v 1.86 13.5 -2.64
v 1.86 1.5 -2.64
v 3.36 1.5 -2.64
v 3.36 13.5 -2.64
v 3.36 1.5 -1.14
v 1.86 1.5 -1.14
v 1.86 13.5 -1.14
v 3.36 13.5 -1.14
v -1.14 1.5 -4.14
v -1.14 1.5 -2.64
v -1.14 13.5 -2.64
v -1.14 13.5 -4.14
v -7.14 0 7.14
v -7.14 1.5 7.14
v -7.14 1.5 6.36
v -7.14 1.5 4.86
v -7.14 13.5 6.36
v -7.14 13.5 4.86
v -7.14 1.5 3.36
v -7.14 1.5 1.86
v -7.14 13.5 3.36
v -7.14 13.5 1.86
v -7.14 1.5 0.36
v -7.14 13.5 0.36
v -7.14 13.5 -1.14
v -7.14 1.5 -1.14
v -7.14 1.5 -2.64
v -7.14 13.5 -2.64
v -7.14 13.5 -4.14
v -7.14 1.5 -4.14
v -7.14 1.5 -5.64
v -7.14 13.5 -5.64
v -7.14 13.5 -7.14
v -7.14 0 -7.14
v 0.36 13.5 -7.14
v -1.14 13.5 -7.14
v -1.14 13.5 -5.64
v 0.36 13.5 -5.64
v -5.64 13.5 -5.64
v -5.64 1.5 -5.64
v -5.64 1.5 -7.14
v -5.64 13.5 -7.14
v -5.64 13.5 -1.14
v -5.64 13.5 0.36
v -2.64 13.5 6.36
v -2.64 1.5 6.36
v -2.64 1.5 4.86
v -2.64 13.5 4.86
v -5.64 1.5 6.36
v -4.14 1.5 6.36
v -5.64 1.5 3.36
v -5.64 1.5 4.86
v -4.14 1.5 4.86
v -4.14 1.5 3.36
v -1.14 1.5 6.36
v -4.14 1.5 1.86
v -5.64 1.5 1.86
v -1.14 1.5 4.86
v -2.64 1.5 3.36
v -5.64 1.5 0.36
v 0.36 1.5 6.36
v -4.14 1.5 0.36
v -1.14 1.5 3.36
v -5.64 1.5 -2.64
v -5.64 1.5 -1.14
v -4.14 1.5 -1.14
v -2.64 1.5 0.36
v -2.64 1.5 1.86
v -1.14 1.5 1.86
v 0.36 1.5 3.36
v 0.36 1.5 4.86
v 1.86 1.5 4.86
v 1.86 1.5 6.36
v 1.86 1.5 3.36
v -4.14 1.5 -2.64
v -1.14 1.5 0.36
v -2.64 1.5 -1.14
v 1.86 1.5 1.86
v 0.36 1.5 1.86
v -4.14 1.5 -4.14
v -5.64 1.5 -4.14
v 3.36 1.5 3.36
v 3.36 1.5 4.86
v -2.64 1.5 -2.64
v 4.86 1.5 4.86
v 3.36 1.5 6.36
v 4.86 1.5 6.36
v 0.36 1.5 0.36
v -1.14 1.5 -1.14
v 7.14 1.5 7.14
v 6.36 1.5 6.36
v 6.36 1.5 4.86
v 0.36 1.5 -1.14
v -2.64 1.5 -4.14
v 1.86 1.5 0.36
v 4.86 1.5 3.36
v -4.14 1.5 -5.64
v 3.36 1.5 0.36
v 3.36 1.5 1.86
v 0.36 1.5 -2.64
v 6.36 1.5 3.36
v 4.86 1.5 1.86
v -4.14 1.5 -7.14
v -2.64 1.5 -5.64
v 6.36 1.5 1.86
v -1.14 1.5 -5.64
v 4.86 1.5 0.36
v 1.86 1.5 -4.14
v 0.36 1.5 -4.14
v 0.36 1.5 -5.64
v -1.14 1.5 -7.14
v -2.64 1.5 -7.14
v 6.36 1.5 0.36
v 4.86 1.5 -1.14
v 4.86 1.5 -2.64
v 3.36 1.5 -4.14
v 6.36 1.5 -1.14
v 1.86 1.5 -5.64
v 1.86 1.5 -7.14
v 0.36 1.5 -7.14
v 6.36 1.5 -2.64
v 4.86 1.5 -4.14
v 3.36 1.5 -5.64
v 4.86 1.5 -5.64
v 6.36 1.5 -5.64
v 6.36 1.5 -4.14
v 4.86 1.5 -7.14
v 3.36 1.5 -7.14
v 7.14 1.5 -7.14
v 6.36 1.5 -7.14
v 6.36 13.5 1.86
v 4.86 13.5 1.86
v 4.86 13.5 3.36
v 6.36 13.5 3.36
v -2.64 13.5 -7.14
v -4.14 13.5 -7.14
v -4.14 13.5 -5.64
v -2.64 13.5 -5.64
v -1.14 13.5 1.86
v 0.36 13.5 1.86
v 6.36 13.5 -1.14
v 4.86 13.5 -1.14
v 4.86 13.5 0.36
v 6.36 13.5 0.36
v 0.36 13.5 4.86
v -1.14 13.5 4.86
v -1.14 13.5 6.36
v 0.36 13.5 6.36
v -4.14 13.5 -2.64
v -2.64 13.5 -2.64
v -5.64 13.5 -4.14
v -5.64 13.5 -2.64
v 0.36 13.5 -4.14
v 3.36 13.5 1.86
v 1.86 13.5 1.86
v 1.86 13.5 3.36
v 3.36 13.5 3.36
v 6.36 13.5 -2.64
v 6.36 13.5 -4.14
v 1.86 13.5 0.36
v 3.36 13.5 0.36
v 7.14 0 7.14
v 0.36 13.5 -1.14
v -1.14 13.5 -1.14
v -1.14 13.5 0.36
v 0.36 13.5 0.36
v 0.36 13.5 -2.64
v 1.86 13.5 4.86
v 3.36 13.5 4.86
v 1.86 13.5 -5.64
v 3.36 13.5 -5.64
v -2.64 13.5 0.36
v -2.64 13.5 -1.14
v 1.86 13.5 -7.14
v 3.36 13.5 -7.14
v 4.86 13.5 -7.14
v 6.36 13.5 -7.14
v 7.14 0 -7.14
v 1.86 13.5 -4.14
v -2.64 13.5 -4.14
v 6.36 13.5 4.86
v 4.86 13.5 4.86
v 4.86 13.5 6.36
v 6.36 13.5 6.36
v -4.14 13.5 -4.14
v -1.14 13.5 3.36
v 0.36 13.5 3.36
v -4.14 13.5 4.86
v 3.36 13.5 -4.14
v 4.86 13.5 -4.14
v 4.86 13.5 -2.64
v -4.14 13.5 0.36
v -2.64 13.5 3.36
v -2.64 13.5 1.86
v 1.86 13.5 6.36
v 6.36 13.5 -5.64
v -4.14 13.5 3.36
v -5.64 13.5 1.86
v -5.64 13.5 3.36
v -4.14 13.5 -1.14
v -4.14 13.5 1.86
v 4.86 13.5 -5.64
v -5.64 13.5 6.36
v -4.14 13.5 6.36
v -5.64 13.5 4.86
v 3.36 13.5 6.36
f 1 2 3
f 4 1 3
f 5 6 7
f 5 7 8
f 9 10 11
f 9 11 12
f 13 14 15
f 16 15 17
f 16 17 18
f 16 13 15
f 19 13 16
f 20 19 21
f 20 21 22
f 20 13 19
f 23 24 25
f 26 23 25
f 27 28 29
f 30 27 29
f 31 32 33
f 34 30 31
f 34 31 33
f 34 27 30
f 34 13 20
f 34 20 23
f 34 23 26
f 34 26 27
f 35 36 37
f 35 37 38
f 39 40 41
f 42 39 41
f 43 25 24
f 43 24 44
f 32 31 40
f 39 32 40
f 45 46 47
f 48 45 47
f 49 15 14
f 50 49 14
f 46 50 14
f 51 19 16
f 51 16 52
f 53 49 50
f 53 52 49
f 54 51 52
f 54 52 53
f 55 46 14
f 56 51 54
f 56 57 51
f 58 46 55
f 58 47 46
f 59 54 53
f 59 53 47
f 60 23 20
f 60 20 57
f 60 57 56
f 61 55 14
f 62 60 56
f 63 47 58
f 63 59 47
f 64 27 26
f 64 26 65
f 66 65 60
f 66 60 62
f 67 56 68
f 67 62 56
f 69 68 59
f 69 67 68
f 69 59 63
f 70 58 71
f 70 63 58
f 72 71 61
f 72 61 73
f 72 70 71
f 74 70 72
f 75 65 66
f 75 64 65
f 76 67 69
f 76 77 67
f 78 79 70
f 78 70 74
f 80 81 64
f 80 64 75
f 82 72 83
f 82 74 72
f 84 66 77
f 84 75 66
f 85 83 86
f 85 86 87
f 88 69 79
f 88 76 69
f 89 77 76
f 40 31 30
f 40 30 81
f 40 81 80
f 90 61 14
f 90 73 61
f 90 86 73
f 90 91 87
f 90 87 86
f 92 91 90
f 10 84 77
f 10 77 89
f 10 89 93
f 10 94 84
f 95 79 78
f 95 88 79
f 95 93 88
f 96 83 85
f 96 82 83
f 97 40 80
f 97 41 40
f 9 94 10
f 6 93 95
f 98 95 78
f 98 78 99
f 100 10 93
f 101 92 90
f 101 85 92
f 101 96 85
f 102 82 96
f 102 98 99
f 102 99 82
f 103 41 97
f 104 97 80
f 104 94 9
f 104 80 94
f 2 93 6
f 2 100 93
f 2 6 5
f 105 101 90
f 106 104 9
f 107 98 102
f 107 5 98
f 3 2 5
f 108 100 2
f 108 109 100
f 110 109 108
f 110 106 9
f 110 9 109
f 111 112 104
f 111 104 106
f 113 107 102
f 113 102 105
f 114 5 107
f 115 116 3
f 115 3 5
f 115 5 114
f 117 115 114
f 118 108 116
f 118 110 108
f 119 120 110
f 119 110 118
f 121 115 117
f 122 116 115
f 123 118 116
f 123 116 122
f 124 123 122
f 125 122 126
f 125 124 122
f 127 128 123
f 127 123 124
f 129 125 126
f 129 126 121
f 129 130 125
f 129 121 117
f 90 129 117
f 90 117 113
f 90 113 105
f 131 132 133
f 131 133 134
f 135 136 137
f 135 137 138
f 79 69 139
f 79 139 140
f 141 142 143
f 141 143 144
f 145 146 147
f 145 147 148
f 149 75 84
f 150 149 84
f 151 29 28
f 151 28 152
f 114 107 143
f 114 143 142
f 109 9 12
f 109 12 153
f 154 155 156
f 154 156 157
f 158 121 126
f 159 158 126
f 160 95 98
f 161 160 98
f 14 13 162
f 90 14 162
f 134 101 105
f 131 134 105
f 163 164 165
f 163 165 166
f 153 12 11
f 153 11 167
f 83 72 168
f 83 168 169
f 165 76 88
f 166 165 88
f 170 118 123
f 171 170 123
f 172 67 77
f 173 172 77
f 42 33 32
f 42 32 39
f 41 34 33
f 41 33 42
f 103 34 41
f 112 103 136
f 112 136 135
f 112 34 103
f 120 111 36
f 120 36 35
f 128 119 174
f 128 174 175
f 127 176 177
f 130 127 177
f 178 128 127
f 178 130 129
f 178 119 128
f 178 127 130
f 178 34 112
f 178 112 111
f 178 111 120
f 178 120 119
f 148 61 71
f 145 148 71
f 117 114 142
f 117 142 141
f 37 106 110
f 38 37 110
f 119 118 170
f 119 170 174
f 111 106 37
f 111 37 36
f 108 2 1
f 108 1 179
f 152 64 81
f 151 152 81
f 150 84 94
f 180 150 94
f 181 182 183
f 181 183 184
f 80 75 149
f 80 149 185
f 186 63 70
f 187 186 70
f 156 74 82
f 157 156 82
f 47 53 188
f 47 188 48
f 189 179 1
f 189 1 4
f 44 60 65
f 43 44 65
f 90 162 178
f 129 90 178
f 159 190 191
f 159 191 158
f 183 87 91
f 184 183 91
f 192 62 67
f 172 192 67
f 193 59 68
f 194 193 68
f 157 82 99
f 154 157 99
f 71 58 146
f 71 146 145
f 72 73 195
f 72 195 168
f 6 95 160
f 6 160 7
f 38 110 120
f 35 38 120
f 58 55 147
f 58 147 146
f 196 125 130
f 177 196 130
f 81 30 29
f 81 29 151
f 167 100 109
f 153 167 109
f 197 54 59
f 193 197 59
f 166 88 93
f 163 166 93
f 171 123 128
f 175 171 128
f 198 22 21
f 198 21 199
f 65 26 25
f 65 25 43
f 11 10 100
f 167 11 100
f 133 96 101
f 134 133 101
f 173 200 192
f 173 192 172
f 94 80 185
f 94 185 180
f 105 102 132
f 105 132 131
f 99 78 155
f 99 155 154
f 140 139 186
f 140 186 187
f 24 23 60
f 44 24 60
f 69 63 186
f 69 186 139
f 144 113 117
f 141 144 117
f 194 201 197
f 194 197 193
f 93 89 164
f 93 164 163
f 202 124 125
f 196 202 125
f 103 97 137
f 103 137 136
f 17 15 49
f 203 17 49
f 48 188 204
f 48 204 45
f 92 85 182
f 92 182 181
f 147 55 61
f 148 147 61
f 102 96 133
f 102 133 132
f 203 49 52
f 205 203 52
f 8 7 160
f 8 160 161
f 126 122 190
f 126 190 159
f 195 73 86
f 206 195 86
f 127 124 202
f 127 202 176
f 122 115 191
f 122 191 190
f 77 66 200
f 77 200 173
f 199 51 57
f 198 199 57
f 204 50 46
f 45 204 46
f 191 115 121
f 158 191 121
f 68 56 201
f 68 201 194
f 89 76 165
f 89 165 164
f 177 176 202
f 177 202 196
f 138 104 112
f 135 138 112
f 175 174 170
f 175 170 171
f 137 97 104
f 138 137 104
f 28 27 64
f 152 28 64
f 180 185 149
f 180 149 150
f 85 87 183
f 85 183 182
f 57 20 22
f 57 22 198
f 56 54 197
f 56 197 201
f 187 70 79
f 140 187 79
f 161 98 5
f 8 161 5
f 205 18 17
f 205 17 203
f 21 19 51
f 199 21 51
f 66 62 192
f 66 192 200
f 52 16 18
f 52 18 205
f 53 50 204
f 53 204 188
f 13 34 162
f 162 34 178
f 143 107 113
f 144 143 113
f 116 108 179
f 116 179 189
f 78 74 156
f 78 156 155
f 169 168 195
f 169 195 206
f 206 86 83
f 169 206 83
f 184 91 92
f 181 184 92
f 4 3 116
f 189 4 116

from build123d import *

# Parameters (mm, degrees)
SKETCH1_W            = 14.28
SKETCH1_H            = 14.28
BOSS_EXTRUDE1_DEPTH  = 1.5
SKETCH3_W            = 1.5
SKETCH3_H            = 1.5
BOSS_EXTRUDE3_DEPTH  = 12
LPATTERN2_COUNT      = 5
LPATTERN2_PITCH      = 3
LPATTERN2_COUNT_DIR2 = 5
LPATTERN2_PITCH_DIR2 = 3


with BuildPart() as part:
    # Sketch1 → Boss-Extrude1 (new body)
    with BuildSketch(Plane(origin=(0, 0, 0), x_dir=(1, 0, 0), z_dir=(0, 1, 0))):
        Rectangle(SKETCH1_W, SKETCH1_H)
    extrude(amount=BOSS_EXTRUDE1_DEPTH)

    # Sketch3 → Boss-Extrude3 (add)
    with BuildSketch(Plane(origin=(0, 1.5, 0), x_dir=(1, 0, 0), z_dir=(0, 1, 0))):
        with Locations((-6.39, 6.39)):
            Rectangle(SKETCH3_W, SKETCH3_H)
    boss_extrude3 = extrude(amount=BOSS_EXTRUDE3_DEPTH)

    # LPattern2: Boss-Extrude3 5 × 5
    with Locations(*[(i * LPATTERN2_PITCH, 0, j * LPATTERN2_PITCH_DIR2) for i in range(LPATTERN2_COUNT) for j in range(LPATTERN2_COUNT_DIR2) if (i, j) != (0, 0)]):
        add(boss_extrude3)


solid = part.part
